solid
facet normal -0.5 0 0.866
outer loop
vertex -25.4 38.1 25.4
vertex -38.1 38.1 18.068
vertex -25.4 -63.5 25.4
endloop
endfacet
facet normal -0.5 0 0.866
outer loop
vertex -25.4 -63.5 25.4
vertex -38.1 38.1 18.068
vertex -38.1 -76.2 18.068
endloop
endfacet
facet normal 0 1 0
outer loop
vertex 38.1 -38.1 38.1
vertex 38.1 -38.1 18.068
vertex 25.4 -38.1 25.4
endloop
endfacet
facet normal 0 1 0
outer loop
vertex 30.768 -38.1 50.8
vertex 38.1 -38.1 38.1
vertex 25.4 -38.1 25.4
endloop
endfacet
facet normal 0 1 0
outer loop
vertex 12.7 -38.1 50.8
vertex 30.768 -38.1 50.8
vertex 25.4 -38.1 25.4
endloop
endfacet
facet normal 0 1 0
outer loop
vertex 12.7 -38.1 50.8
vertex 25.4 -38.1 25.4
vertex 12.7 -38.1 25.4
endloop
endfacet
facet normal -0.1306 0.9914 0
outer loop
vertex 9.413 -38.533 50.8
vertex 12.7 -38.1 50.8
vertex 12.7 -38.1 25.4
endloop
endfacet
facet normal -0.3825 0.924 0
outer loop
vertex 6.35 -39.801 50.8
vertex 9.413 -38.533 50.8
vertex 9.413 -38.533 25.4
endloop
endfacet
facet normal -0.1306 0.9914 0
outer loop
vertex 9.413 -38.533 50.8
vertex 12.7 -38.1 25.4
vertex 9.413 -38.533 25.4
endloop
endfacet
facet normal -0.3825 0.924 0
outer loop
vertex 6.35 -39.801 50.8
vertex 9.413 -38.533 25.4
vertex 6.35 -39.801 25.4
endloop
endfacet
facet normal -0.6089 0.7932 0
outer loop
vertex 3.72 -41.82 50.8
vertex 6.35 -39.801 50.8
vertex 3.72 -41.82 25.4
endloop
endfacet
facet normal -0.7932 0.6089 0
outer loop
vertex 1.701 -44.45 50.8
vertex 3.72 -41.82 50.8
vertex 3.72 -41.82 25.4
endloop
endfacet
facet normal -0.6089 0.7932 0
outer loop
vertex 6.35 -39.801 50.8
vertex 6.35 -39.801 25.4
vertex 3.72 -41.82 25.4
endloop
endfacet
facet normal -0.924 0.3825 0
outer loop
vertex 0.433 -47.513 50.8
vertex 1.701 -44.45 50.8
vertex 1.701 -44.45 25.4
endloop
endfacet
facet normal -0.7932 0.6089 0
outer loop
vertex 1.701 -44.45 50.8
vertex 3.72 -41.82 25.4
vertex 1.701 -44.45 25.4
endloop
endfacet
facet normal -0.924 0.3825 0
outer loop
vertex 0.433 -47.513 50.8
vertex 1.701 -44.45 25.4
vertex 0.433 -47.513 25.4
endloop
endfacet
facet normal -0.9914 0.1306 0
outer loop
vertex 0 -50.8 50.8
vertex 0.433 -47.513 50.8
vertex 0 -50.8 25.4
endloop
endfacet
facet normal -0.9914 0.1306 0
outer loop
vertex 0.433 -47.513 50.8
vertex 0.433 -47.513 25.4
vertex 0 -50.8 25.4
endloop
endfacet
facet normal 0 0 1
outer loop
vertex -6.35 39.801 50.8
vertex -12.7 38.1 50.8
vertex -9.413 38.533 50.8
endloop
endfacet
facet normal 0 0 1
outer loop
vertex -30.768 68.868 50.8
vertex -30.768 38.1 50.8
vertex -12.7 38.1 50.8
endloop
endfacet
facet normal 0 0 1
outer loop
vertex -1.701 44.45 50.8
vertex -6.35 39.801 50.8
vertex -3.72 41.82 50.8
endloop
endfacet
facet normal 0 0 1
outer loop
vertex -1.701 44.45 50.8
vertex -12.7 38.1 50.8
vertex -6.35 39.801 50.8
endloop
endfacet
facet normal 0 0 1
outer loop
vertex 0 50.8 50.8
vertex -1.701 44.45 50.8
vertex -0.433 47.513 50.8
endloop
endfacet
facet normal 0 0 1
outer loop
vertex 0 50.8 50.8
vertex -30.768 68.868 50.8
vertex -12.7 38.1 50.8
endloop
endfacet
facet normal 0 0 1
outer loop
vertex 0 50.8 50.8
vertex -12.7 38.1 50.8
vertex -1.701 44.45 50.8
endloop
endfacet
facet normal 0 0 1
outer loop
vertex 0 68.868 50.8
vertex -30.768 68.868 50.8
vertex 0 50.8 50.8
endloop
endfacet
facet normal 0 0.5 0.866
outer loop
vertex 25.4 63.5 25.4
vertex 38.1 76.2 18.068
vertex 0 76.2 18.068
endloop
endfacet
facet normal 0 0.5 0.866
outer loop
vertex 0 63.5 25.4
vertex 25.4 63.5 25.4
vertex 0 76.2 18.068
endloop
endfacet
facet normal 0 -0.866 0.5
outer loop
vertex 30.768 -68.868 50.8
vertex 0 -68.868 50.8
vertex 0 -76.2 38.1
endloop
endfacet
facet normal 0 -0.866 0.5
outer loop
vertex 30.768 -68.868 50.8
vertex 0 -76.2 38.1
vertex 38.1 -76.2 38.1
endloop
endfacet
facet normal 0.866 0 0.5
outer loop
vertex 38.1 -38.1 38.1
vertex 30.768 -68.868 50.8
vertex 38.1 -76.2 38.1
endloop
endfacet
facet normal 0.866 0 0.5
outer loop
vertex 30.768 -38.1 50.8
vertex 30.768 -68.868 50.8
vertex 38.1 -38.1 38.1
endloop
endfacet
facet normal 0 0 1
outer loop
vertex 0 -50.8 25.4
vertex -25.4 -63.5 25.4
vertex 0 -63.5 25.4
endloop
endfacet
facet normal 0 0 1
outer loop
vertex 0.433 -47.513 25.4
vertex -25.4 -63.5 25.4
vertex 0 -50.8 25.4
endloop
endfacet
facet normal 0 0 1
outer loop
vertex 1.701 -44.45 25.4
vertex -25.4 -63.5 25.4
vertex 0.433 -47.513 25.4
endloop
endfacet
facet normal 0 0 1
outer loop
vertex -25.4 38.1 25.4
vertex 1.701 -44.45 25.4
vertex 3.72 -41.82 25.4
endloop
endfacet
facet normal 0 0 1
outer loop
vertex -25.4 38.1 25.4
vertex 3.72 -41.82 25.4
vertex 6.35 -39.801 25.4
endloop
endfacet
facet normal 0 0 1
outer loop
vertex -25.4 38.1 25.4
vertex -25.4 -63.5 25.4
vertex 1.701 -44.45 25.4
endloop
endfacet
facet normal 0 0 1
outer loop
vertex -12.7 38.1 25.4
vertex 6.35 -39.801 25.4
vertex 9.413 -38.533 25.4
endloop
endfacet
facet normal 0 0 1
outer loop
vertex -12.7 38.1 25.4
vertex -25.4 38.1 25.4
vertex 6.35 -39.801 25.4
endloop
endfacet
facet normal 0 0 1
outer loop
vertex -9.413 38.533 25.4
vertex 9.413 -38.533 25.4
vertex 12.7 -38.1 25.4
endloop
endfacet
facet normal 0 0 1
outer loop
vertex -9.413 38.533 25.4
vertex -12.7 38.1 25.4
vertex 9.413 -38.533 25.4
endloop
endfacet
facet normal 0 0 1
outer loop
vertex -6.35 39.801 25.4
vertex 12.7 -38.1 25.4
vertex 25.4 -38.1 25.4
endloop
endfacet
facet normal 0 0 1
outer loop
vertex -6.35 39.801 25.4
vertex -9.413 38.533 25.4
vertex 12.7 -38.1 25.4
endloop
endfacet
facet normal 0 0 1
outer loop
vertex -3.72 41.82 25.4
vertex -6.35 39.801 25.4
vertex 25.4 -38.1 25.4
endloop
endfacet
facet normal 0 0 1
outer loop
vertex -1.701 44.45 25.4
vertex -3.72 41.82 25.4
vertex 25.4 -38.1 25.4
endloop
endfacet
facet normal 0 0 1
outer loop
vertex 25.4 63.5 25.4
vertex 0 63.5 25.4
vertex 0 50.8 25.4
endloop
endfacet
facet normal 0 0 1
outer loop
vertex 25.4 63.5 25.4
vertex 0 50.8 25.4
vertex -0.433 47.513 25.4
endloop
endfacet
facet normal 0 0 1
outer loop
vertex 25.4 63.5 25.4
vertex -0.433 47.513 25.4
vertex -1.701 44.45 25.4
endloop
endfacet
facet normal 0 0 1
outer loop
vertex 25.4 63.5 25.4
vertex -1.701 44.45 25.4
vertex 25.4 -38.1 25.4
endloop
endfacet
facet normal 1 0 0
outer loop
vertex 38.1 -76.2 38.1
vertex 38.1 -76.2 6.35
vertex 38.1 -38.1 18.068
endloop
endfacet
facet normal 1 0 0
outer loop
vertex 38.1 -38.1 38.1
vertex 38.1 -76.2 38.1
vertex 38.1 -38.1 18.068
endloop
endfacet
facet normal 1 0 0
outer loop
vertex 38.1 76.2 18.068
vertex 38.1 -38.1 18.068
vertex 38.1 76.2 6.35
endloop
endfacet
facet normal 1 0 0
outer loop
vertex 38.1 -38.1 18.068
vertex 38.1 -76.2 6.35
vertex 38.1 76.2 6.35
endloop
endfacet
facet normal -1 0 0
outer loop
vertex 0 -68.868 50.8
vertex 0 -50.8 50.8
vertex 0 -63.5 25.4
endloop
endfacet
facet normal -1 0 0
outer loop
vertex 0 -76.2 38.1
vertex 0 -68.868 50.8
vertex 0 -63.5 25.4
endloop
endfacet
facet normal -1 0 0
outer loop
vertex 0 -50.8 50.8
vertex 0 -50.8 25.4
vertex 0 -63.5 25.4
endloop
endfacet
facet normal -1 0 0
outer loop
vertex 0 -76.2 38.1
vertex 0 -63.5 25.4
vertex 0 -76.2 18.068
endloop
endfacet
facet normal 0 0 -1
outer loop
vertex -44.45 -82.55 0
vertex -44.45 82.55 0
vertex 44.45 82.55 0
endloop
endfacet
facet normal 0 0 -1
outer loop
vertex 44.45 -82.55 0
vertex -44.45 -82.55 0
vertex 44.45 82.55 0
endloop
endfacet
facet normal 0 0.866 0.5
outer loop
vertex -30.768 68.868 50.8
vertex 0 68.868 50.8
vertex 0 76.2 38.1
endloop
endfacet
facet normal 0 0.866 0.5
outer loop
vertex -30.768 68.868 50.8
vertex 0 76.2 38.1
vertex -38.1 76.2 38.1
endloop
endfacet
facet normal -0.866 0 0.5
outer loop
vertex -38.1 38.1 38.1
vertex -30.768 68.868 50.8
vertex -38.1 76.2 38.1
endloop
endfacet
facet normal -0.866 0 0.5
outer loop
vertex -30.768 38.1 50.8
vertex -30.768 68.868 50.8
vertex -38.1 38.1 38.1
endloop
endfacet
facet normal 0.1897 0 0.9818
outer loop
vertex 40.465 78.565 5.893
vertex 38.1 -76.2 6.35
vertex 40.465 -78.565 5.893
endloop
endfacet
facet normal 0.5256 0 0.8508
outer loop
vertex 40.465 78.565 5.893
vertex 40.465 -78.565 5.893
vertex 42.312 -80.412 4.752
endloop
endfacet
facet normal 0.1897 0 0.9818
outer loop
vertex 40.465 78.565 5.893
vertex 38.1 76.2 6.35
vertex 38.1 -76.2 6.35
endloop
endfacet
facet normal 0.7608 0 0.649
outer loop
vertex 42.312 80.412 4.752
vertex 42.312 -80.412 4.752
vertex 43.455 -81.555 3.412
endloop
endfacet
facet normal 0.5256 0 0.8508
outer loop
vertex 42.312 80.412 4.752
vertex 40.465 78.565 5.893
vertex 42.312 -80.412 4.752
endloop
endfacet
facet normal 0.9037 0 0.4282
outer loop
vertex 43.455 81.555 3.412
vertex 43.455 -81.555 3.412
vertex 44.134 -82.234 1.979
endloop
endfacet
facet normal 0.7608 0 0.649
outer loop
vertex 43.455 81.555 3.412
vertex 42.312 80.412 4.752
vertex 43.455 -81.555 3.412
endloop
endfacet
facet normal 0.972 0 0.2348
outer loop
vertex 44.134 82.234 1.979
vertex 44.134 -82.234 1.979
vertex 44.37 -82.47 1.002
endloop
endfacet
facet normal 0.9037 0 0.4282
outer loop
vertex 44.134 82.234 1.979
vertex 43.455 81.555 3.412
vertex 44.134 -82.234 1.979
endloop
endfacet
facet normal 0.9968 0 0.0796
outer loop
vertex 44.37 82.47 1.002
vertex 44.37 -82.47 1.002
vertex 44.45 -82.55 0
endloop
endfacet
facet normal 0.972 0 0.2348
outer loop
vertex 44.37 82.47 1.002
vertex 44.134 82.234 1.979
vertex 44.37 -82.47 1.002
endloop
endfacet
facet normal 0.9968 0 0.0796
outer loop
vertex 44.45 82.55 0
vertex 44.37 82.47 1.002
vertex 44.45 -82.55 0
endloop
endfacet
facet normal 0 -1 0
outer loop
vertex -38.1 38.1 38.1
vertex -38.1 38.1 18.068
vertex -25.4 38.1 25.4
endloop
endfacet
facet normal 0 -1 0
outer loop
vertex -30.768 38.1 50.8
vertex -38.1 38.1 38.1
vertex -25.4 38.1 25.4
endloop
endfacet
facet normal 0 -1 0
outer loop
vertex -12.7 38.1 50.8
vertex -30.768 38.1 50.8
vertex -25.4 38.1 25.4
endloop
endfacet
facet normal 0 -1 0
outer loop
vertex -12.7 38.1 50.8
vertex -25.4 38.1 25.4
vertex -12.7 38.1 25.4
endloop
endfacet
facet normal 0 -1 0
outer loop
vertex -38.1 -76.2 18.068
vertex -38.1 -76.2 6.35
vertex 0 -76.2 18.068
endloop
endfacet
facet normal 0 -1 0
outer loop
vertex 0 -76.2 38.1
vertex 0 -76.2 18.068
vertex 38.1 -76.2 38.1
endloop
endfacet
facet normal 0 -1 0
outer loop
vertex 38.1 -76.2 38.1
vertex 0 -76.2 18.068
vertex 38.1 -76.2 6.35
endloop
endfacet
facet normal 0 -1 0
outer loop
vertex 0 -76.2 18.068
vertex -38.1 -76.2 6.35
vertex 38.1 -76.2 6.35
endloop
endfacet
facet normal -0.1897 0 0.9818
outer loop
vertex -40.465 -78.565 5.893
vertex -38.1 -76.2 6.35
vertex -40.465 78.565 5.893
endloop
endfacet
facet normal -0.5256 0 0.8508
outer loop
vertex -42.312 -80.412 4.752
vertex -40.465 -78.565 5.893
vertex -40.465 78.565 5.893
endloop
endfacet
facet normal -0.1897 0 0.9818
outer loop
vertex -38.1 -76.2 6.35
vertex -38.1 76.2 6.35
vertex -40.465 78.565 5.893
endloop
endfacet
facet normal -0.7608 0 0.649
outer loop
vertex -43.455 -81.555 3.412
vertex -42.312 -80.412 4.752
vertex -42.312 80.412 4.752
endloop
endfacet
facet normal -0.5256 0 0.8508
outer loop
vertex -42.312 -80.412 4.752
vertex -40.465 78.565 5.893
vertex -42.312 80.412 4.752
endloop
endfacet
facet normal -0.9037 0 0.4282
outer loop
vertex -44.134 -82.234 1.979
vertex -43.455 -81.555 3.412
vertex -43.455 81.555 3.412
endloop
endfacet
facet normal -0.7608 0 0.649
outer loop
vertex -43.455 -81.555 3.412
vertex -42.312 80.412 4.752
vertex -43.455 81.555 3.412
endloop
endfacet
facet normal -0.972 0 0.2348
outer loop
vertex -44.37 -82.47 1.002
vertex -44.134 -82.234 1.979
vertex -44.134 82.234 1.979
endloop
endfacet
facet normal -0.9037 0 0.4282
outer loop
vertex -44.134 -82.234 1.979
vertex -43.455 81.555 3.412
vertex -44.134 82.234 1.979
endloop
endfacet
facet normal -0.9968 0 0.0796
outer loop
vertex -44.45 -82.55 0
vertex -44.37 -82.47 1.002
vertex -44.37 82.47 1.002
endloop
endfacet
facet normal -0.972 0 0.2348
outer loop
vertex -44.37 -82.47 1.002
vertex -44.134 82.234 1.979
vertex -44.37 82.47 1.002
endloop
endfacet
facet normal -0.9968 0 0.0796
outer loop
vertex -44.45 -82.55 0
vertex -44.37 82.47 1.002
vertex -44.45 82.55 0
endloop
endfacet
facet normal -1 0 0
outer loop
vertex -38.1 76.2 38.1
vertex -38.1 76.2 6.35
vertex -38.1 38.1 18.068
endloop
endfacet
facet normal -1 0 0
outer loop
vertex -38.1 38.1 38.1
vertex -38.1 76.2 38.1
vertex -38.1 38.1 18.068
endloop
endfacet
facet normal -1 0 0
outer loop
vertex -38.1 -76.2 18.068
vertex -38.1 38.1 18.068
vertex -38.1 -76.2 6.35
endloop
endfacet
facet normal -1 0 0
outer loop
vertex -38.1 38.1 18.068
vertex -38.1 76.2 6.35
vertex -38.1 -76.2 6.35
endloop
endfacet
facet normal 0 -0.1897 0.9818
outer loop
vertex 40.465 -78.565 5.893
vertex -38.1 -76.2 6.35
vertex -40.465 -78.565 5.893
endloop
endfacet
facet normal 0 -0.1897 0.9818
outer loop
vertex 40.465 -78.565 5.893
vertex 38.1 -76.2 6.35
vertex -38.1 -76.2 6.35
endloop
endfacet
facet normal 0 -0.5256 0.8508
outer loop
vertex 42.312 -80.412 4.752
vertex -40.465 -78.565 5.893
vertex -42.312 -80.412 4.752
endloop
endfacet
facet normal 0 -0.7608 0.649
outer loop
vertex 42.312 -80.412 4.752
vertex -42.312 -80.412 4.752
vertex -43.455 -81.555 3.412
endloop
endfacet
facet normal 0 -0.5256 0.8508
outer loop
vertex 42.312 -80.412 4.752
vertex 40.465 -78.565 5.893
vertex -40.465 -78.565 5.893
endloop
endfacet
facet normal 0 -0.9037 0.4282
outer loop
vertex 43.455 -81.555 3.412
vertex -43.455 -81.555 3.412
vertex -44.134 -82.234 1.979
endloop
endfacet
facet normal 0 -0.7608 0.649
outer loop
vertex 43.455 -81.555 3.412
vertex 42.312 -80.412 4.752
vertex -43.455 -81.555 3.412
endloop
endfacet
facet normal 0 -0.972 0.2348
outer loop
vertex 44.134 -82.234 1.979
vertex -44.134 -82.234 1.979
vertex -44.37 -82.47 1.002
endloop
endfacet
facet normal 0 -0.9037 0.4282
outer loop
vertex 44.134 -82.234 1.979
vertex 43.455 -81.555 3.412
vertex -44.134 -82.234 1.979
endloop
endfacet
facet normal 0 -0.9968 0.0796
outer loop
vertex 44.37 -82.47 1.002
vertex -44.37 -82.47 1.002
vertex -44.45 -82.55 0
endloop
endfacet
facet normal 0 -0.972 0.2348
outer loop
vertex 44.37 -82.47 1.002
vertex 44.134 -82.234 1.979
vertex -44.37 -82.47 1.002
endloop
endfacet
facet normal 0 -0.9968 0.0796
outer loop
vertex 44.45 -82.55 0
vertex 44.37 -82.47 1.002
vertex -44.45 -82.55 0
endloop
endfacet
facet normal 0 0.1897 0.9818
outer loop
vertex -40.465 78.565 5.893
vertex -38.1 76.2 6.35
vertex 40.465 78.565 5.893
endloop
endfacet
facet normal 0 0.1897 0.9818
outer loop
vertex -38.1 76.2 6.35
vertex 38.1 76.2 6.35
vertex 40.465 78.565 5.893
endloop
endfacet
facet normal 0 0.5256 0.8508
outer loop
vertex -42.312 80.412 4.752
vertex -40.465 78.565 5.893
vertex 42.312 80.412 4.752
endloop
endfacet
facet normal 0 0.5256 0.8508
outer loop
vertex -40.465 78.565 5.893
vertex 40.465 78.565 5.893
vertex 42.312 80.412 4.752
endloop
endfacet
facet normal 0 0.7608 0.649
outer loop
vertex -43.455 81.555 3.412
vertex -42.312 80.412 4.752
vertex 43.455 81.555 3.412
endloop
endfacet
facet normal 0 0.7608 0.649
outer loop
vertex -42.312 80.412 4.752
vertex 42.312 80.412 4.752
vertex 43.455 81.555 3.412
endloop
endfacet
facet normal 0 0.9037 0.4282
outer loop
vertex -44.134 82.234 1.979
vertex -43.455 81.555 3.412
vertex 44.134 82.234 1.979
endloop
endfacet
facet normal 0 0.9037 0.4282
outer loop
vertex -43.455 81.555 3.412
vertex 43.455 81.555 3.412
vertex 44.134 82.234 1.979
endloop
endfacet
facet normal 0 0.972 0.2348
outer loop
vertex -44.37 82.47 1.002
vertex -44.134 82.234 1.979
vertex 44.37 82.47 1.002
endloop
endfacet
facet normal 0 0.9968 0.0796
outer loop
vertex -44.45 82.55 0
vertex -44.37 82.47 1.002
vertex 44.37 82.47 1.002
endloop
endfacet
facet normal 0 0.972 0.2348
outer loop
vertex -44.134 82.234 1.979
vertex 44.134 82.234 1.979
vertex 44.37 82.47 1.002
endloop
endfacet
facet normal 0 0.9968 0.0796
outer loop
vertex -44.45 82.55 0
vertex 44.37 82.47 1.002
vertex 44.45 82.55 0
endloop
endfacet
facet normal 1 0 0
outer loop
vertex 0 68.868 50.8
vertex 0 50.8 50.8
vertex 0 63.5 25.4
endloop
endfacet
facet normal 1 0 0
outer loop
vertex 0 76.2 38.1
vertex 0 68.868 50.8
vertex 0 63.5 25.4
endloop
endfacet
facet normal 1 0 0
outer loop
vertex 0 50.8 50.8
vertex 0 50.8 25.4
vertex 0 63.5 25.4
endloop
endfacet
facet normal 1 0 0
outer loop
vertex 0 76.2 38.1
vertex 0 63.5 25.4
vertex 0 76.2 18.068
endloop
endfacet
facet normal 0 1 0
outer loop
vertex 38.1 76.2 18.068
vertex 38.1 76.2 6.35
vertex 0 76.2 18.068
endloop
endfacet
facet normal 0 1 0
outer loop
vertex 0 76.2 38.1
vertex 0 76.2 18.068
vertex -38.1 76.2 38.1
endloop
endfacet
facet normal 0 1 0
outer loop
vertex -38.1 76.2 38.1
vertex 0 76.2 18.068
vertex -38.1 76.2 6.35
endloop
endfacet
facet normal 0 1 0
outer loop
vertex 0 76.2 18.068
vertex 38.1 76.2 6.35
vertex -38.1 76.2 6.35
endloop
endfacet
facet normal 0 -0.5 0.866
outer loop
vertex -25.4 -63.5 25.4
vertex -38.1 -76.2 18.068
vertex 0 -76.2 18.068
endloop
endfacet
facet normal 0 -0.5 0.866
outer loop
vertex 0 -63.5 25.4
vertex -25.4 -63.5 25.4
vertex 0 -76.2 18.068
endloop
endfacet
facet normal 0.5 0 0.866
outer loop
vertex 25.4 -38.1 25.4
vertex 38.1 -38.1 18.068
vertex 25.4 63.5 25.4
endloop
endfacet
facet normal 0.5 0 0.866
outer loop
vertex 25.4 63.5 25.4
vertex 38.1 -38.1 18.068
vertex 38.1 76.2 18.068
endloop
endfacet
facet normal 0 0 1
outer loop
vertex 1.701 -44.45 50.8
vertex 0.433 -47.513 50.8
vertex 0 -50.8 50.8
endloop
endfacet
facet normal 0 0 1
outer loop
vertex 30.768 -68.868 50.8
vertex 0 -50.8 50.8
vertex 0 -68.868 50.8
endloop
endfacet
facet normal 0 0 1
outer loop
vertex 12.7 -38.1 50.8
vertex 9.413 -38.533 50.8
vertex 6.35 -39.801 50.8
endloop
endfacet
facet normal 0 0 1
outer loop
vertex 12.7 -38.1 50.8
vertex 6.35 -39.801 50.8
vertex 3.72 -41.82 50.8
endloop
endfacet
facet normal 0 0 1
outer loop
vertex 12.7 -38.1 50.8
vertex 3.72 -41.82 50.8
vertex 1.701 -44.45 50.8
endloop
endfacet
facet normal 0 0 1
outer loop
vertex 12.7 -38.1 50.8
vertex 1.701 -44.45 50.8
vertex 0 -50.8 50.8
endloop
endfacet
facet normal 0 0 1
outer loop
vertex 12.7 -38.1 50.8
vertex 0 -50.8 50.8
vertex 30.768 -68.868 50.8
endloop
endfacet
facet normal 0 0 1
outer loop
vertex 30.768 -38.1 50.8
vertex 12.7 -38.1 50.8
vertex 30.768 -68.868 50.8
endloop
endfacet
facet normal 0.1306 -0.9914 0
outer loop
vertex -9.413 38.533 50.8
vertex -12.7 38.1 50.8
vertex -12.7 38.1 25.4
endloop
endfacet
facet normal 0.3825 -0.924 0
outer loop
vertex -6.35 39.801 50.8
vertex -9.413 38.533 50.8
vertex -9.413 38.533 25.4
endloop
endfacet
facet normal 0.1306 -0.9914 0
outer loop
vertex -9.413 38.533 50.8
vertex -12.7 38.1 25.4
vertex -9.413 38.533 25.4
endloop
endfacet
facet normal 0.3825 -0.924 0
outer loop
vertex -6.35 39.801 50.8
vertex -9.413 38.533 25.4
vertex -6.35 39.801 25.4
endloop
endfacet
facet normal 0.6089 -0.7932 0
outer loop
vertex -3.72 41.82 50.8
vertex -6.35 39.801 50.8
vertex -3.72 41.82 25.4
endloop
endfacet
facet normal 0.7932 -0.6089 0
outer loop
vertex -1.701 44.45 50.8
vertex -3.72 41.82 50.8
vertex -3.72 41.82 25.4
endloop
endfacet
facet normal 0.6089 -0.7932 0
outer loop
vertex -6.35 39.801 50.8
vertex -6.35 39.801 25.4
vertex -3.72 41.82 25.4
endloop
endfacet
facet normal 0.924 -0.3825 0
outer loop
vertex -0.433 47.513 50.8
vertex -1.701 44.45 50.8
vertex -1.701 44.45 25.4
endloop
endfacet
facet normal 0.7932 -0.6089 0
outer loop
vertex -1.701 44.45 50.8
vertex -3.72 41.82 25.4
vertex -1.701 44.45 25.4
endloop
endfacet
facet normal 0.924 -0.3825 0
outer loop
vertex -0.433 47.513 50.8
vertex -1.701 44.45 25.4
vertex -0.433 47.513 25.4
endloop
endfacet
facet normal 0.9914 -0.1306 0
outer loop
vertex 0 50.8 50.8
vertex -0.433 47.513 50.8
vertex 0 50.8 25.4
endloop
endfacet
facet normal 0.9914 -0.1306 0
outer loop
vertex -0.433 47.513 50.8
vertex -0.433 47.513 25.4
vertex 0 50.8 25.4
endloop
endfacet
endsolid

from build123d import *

# Parameters (mm, degrees)
F0_W     = 88.9
F0_H     = 165.1
F1_DEPTH = 6.35
F2_DEPTH = 25.4
F3_DEPTH = 50.8
F4_SIZE2 = 7.3323484187
F4_SIZE  = 12.7
F5_R     = 6.34999
F6_SIZE2 = 7.3323484187
F6_SIZE  = 12.7
F7_SIZE2 = 7.3323484187
F7_SIZE  = 12.7


# Not quite as in the source:
# - a fillet or chamfer is up to 0.001 mm smaller than in the source, because OpenCascade refuses the exact size


with BuildPart() as f1:
    # F0 (on Top) → F1 (new body)
    with BuildSketch(Plane.XY):
        Rectangle(F0_W, F0_H)
        Polygon((-38.1, 38.1), (-38.1, 76.2), (0, 76.2), (38.1, 76.2), (38.1, -38.1), (38.1, -76.2), (0, -76.2), (-38.1, -76.2), align=None, mode=Mode.SUBTRACT)
    extrude(amount=F1_DEPTH)

    # F0 (on Top) → F2 (join)
    with BuildSketch(Plane.XY):
        with BuildLine():
            Line((38.1, 76.2), (0, 76.2))
            Line((0, 76.2), (0, 50.8))
            ThreePointArc((0, 50.8), (-3.7197438789, 41.8197438789), (-12.7, 38.1))
            Line((-12.7, 38.1), (-38.1, 38.1))
            Line((-38.1, 38.1), (-38.1, -76.2))
            Line((-38.1, -76.2), (0, -76.2))
            Line((0, -76.2), (0, -50.8))
            ThreePointArc((0, -50.8), (3.7197438789, -41.8197438789), (12.7, -38.1))
            Line((12.7, -38.1), (38.1, -38.1))
            Line((38.1, -38.1), (38.1, 76.2))
        make_face()
    extrude(amount=F2_DEPTH)

    # F0 (on Top) → F3 (join)
    with BuildSketch(Plane.XY):
        with BuildLine():
            Line((0, 76.2), (-38.1, 76.2))
            Line((-38.1, 76.2), (-38.1, 38.1))
            Line((-38.1, 38.1), (-12.7, 38.1))
            ThreePointArc((-12.7, 38.1), (-3.7197438789, 41.8197438789), (0, 50.8))
            Line((0, 50.8), (0, 76.2))
        make_face()
        with BuildLine():
            Line((38.1, -76.2), (38.1, -38.1))
            Line((38.1, -38.1), (12.7, -38.1))
            ThreePointArc((12.7, -38.1), (3.7197438789, -41.8197438789), (0, -50.8))
            Line((0, -50.8), (0, -76.2))
            Line((0, -76.2), (38.1, -76.2))
        make_face()
    extrude(amount=F3_DEPTH)

    # F4
    f4_edges = [f1.edges().sort_by_distance(p)[0] for p in [
        (-38.1, -19.05, 25.4),
        (-19.05, -76.2, 25.4),
        (38.1, 19.05, 25.4),
        (19.05, 76.2, 25.4),
    ]]
    f4_side = f1.faces().sort_by_distance((0, 0, 25.4))[0]
    chamfer(f4_edges, length=F4_SIZE, length2=F4_SIZE2, reference=f4_side)

    # F5 (radius 6.35 in the source; OpenCascade refuses exactly that, so slightly less here)
    f5_edges = [f1.edges().sort_by_distance(p)[0] for p in [
        (44.45, 0, 6.35),
        (0, -82.55, 6.35),
        (-44.45, 0, 6.35),
        (0, 82.55, 6.35),
    ]]
    fillet(f5_edges, radius=F5_R)

    # F6
    f6_edges = [f1.edges().sort_by_distance(p)[0] for p in [
        (-19.05, 76.2, 50.8),
        (-38.1, 57.15, 50.8),
    ]]
    chamfer(f6_edges, length=F6_SIZE, length2=F6_SIZE2)

    # F7
    f7_edges = [f1.edges().sort_by_distance(p)[0] for p in [
        (38.1, -57.15, 50.8),
        (19.05, -76.2, 50.8),
    ]]
    chamfer(f7_edges, length=F7_SIZE, length2=F7_SIZE2)


solid = f1.part
